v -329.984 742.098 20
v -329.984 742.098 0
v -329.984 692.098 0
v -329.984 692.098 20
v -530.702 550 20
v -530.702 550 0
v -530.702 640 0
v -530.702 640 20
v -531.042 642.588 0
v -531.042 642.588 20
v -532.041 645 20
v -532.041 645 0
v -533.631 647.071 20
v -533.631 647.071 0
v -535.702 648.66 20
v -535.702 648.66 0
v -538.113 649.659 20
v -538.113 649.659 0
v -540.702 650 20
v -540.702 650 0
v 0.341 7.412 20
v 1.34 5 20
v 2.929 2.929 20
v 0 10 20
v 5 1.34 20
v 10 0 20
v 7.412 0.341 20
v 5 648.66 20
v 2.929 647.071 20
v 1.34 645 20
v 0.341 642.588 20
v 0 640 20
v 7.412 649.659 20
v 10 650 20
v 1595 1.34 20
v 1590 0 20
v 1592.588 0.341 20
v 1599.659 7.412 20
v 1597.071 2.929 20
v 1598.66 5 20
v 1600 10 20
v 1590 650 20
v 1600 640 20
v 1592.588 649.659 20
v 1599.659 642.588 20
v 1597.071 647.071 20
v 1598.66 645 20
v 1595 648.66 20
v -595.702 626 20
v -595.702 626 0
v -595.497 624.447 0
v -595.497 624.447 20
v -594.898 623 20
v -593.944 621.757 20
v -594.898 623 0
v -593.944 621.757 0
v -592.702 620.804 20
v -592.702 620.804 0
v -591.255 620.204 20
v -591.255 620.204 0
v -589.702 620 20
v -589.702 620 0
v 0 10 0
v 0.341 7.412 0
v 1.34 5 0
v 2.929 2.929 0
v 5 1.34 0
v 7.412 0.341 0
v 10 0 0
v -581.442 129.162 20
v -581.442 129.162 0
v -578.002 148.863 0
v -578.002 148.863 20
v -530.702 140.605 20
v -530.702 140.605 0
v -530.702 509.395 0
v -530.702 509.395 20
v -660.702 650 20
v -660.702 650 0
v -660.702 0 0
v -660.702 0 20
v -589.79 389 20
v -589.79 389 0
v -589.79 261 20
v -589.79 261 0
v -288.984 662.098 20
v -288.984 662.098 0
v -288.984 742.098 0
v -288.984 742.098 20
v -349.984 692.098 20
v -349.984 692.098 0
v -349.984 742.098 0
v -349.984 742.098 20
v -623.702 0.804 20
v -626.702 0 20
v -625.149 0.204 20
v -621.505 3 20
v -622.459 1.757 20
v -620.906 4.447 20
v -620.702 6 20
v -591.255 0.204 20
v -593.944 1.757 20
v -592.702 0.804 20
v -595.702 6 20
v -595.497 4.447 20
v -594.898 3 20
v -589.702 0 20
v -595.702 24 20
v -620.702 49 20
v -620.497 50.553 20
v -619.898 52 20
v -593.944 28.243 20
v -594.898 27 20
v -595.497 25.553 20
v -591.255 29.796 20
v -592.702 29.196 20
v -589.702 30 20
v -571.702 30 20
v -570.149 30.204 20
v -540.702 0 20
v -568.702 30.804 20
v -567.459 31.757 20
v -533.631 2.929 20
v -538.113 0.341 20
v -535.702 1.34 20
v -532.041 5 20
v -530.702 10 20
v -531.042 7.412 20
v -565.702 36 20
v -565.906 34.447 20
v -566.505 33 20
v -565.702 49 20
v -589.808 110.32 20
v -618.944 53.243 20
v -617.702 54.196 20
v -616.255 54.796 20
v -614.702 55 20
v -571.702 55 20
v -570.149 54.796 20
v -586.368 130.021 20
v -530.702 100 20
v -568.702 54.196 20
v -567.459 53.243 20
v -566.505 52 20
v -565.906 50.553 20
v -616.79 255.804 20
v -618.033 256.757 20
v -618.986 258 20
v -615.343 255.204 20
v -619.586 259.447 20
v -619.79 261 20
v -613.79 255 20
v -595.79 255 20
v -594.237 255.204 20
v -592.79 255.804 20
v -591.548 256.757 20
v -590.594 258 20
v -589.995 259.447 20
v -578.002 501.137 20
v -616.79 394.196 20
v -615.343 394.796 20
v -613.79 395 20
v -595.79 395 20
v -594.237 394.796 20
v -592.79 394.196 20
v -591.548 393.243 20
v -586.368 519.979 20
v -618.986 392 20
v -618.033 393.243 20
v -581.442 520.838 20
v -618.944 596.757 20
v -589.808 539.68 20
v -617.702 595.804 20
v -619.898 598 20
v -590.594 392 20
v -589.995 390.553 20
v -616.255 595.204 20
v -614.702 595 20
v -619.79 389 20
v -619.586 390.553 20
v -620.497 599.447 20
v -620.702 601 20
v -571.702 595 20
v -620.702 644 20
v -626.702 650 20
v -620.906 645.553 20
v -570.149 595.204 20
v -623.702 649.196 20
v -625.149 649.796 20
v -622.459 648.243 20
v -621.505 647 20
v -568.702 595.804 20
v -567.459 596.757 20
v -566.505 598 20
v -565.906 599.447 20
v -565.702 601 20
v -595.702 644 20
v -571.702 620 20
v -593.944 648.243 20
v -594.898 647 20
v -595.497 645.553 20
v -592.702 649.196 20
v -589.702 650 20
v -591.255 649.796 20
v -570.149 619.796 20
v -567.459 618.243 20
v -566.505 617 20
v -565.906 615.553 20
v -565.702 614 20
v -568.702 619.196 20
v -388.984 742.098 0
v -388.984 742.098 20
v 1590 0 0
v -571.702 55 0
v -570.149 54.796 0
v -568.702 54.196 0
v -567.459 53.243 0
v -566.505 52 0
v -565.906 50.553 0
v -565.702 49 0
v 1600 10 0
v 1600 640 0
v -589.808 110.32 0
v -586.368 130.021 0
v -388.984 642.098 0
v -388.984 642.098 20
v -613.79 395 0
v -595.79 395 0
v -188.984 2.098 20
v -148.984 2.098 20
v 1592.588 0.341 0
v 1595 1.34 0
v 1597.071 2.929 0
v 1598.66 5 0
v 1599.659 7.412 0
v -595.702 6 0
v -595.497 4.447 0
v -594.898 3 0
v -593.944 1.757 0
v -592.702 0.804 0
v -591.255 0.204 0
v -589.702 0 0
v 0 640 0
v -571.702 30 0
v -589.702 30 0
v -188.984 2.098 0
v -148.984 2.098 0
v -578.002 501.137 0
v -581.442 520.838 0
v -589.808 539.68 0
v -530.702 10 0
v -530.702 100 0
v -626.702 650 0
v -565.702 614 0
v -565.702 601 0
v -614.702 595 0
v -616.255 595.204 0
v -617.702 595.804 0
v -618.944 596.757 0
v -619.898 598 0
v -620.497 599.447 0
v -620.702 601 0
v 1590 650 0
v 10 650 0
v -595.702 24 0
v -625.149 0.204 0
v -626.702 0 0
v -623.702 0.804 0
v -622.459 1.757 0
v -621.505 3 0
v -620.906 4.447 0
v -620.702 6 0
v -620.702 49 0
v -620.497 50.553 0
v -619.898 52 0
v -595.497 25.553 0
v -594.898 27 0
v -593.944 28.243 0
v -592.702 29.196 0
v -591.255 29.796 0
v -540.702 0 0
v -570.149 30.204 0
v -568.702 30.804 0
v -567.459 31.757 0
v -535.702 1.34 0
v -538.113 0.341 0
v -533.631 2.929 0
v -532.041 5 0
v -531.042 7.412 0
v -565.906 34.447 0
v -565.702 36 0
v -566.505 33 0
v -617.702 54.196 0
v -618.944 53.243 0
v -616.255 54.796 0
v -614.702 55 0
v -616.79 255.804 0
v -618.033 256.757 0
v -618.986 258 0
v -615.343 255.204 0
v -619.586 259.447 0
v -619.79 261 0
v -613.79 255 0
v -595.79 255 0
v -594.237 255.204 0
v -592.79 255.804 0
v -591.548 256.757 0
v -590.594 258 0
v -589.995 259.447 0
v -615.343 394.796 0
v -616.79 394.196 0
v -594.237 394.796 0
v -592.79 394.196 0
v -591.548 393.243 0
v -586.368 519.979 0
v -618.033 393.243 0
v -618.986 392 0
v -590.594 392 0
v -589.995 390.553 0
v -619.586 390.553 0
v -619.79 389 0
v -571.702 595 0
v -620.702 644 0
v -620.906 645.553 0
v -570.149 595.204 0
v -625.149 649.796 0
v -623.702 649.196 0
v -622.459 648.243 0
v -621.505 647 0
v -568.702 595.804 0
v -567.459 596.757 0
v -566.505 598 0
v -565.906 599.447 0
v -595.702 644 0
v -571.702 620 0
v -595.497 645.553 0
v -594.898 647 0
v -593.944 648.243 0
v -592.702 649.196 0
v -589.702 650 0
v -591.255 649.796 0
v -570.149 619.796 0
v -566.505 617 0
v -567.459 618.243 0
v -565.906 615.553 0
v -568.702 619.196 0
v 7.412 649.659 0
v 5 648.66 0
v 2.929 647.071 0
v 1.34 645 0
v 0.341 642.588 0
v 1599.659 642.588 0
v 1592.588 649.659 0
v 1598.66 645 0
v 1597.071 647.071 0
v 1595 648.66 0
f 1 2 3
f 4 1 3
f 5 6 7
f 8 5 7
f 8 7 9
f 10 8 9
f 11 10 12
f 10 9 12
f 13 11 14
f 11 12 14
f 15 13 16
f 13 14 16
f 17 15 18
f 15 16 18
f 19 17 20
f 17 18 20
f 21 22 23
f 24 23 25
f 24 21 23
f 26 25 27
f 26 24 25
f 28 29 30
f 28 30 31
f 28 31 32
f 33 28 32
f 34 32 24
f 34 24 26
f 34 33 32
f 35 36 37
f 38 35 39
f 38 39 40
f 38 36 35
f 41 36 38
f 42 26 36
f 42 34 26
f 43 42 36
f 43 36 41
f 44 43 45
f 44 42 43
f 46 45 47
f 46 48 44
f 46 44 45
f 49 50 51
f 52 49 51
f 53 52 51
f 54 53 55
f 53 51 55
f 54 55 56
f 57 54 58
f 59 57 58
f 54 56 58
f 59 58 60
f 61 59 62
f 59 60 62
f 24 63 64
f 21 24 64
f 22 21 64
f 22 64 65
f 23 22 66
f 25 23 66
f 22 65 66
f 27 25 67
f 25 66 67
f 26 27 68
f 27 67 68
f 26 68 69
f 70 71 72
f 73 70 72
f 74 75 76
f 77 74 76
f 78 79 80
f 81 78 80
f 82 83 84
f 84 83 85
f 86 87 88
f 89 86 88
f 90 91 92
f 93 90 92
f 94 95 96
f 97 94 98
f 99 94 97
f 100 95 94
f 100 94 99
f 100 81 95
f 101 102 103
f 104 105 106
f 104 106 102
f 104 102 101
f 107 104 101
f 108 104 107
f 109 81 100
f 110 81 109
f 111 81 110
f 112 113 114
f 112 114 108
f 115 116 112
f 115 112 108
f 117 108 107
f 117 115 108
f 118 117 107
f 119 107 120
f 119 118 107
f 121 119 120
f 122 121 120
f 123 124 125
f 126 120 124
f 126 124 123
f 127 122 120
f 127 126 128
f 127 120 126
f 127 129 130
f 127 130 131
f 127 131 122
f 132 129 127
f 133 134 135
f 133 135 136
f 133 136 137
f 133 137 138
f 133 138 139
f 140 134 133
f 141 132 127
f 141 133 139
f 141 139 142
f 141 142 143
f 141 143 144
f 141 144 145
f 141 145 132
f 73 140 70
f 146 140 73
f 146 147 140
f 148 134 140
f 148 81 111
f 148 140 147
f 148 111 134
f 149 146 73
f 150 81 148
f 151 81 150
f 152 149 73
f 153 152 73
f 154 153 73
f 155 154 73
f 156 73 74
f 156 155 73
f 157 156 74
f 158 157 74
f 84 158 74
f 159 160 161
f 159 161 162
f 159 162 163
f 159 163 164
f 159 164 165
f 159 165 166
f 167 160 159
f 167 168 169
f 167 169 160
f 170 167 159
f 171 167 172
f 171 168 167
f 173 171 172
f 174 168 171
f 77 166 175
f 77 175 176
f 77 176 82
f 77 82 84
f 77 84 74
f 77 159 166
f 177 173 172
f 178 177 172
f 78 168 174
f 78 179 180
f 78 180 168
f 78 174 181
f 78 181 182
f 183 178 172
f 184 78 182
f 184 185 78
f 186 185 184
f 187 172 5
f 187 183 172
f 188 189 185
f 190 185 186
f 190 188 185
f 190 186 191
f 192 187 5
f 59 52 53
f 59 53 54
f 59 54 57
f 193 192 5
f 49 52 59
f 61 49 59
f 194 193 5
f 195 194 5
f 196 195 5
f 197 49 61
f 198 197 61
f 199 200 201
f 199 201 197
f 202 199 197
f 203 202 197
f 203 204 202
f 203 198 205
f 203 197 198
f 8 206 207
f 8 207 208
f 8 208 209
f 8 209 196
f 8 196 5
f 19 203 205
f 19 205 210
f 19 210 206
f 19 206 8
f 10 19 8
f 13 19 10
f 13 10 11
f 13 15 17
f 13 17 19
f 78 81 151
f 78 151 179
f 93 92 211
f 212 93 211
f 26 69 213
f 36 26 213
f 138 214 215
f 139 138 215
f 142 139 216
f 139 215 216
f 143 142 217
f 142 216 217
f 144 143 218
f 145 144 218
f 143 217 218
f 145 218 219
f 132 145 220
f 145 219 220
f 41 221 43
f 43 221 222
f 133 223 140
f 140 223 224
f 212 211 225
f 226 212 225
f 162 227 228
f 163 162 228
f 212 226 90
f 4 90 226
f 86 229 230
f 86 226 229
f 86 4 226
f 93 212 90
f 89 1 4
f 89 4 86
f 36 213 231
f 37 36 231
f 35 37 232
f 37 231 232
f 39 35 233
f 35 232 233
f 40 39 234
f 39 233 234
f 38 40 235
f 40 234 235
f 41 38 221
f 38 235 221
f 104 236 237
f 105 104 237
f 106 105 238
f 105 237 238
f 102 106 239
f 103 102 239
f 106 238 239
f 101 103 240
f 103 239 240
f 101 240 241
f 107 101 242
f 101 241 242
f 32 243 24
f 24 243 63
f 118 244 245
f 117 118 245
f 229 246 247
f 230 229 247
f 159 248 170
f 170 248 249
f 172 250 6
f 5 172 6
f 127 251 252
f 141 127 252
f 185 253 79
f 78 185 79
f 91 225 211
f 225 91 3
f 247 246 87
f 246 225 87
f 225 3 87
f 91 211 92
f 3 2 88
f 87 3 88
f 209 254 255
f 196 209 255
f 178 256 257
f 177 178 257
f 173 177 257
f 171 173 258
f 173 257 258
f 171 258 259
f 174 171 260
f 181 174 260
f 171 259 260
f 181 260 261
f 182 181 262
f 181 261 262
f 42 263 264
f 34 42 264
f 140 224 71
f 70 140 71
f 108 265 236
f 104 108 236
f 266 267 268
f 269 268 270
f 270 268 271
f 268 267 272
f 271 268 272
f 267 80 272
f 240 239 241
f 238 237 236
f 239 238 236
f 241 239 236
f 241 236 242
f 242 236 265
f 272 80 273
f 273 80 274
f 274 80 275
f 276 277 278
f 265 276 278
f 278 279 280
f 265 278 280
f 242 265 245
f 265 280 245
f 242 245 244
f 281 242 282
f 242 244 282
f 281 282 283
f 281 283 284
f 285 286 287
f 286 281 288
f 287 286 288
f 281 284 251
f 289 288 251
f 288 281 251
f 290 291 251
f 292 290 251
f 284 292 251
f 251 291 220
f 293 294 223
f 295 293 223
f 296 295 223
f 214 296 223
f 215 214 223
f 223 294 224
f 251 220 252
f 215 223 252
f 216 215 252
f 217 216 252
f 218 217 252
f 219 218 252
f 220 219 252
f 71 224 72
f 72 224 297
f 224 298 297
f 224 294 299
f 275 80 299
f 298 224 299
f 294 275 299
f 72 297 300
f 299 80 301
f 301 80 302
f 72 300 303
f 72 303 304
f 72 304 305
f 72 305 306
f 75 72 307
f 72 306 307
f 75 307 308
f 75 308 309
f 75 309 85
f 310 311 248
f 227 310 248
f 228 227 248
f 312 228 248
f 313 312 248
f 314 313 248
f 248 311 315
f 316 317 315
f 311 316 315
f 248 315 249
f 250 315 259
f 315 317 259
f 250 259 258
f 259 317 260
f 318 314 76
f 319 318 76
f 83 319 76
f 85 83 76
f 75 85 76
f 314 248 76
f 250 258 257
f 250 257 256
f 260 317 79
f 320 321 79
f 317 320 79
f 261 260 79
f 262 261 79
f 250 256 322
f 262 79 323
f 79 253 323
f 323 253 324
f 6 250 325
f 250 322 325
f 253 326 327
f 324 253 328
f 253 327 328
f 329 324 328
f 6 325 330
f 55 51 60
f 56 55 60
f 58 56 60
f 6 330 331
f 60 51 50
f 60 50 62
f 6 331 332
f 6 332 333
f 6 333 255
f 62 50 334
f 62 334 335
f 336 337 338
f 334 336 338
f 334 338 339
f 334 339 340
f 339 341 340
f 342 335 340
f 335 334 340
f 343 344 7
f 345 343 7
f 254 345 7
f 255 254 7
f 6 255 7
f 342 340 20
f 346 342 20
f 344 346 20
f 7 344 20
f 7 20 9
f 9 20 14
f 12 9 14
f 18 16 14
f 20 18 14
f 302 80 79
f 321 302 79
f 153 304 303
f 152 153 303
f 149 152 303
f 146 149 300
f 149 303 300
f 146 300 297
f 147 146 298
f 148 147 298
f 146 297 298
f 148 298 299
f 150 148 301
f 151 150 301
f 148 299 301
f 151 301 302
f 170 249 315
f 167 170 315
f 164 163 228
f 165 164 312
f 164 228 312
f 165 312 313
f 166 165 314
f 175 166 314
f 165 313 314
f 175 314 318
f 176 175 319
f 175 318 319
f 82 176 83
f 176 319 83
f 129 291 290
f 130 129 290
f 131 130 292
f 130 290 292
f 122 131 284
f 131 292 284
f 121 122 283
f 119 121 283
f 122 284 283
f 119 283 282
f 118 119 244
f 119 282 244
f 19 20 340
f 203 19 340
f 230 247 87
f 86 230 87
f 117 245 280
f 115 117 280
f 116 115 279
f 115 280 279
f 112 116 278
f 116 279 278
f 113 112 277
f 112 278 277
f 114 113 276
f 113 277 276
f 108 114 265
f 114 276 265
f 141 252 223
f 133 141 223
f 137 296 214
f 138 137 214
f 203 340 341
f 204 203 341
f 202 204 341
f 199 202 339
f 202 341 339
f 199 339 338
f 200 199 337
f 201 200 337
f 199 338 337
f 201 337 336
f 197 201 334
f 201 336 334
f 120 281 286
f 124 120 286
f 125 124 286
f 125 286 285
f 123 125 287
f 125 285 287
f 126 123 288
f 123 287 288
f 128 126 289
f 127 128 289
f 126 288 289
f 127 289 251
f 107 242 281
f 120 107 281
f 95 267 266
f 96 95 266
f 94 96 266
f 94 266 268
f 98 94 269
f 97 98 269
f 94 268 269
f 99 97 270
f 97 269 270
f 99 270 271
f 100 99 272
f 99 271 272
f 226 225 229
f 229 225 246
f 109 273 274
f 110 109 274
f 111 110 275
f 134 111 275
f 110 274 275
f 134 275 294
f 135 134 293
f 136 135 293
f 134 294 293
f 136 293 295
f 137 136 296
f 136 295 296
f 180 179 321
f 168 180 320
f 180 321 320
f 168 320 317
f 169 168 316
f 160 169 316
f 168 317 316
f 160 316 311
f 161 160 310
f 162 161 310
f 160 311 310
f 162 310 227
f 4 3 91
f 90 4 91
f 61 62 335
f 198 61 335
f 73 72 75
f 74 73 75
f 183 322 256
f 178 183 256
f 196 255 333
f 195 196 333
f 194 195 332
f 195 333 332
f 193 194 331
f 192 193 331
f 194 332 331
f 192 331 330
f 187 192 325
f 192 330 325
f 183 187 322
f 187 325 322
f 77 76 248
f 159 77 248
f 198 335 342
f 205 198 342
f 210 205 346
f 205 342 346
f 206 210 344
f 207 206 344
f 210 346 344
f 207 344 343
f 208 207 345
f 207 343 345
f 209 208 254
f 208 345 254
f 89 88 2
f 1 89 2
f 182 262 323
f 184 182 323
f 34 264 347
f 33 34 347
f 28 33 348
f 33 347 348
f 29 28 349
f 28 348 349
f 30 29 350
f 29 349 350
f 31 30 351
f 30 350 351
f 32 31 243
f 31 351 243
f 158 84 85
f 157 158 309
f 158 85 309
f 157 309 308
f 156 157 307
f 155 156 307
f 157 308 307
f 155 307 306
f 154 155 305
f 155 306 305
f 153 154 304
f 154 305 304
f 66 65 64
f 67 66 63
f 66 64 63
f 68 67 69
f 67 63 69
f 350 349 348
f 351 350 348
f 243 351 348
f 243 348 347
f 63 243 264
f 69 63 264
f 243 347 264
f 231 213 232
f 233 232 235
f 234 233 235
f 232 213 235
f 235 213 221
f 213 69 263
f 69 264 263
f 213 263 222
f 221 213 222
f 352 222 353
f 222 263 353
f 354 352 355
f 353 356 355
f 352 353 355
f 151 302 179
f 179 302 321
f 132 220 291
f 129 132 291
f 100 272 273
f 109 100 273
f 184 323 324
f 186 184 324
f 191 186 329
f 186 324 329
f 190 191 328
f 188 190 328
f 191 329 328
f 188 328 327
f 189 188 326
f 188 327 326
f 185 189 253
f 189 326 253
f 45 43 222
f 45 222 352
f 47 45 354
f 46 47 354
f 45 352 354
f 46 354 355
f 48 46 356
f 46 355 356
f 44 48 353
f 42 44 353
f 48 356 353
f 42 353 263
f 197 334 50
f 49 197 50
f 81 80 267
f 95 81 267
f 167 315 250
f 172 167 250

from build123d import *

# Parameters (mm, degrees)
F4_DEPTH = 20
F5_DEPTH = 20
F6_DEPTH = 20


with BuildPart() as f4:
    # F3 (on Top) → F4 (new body)
    with BuildSketch(Plane.XY):
        with BuildLine():
            Line((-589.701622963, 0), (-540.701622963, 0))
            ThreePointArc((-540.701622963, 0), (-533.6305551511, 2.9289321881), (-530.701622963, 10))
            Line((-530.701622963, 10), (-530.701622963, 100))
            Line((-530.701622963, 100), (-589.807523595, 110.319520845))
            Line((-589.807523595, 110.319520845), (-586.3676833134, 130.0214877224))
            Line((-586.3676833134, 130.0214877224), (-581.442191594, 129.1615276519))
            Line((-581.442191594, 129.1615276519), (-578.0023513124, 148.8634945293))
            Line((-578.0023513124, 148.8634945293), (-530.701622963, 140.6050829838))
            Line((-530.701622963, 140.6050829838), (-530.701622963, 509.3949170162))
            Line((-530.701622963, 509.3949170162), (-578.0023513124, 501.1365054707))
            Line((-578.0023513124, 501.1365054707), (-581.442191594, 520.8384723481))
            Line((-581.442191594, 520.8384723481), (-586.3676833134, 519.9785122776))
            Line((-586.3676833134, 519.9785122776), (-589.807523595, 539.680479155))
            Line((-589.807523595, 539.680479155), (-530.701622963, 550))
            Line((-530.701622963, 550), (-530.701622963, 640))
            ThreePointArc((-530.701622963, 640), (-533.6305551511, 647.0710678119), (-540.701622963, 650))
            Line((-540.701622963, 650), (-589.701622963, 650))
            ThreePointArc((-589.701622963, 650), (-593.9442636501, 648.2426406871), (-595.701622963, 644))
            Line((-595.701622963, 644), (-595.701622963, 626))
            ThreePointArc((-595.701622963, 626), (-593.9442636501, 621.7573593129), (-589.701622963, 620))
            Line((-589.701622963, 620), (-571.701622963, 620))
            ThreePointArc((-571.701622963, 620), (-567.4589822758, 618.2426406871), (-565.701622963, 614))
            Line((-565.701622963, 614), (-565.701622963, 601))
            ThreePointArc((-565.701622963, 601), (-567.4589822758, 596.7573593129), (-571.701622963, 595))
            Line((-571.701622963, 595), (-614.701622963, 595))
            ThreePointArc((-614.701622963, 595), (-618.9442636501, 596.7573593129), (-620.701622963, 601))
            Line((-620.701622963, 601), (-620.701622963, 644))
            ThreePointArc((-620.701622963, 644), (-622.4589822758, 648.2426406871), (-626.701622963, 650))
            Line((-626.701622963, 650), (-660.701622963, 650))
            Line((-660.701622963, 650), (-660.701622963, 0))
            Line((-660.701622963, 0), (-626.701622963, 0))
            ThreePointArc((-626.701622963, 0), (-622.4589822758, 1.7573593129), (-620.701622963, 6))
            Line((-620.701622963, 6), (-620.701622963, 49))
            ThreePointArc((-620.701622963, 49), (-618.9442636501, 53.2426406871), (-614.701622963, 55))
            Line((-614.701622963, 55), (-571.701622963, 55))
            ThreePointArc((-571.701622963, 55), (-567.4589822758, 53.2426406871), (-565.701622963, 49))
            Line((-565.701622963, 49), (-565.701622963, 36))
            ThreePointArc((-565.701622963, 36), (-567.4589822758, 31.7573593129), (-571.701622963, 30))
            Line((-571.701622963, 30), (-589.701622963, 30))
            ThreePointArc((-589.701622963, 30), (-593.9442636501, 28.2426406871), (-595.701622963, 24))
            Line((-595.701622963, 24), (-595.701622963, 6))
            ThreePointArc((-595.701622963, 6), (-593.9442636501, 1.7573593129), (-589.701622963, 0))
        make_face()
        with BuildLine():
            Line((-595.7902641296, 255), (-613.7902641296, 255))
            ThreePointArc((-613.7902641296, 255), (-618.0329048168, 256.7573593129), (-619.7902641296, 261))
            Line((-619.7902641296, 261), (-619.7902641296, 325))
            Line((-619.7902641296, 325), (-619.7902641296, 389))
            ThreePointArc((-619.7902641296, 389), (-618.0329048168, 393.2426406871), (-613.7902641296, 395))
            Line((-613.7902641296, 395), (-595.7902641296, 395))
            ThreePointArc((-595.7902641296, 395), (-591.5476234425, 393.2426406871), (-589.7902641296, 389))
            Line((-589.7902641296, 389), (-589.7902641296, 325))
            Line((-589.7902641296, 325), (-589.7902641296, 261))
            ThreePointArc((-589.7902641296, 261), (-591.5476234425, 256.7573593129), (-595.7902641296, 255))
        make_face(mode=Mode.SUBTRACT)
    extrude(amount=F4_DEPTH)


with BuildPart() as f5:
    # F2 (on Top) → F5 (new body)
    with BuildSketch(Plane.XY):
        Polygon((-188.9841258526, 2.0980232812), (-148.9841258526, 2.0980232812), (-288.9841258526, 662.0980232812), (-288.9841258526, 742.0980232812), (-329.9841258526, 742.0980232812), (-329.9841258526, 692.0980232812), (-349.9841258526, 692.0980232812), (-349.9841258526, 742.0980232812), (-388.9841258526, 742.0980232812), (-388.9841258526, 642.0980232812), align=None)
    extrude(amount=F5_DEPTH)


with BuildPart() as f6:
    # F1 (on Top) → F6 (new body)
    with BuildSketch(Plane.XY):
        with BuildLine():
            ThreePointArc((0, 10), (2.9289321881, 2.9289321881), (10, 0))
            Line((10, 0), (1590, 0))
            ThreePointArc((1590, 0), (1597.0710678119, 2.9289321881), (1600, 10))
            Line((1600, 10), (1600, 640))
            ThreePointArc((1600, 640), (1597.0710678119, 647.0710678119), (1590, 650))
            Line((1590, 650), (10, 650))
            ThreePointArc((10, 650), (2.9289321881, 647.0710678119), (0, 640))
            Line((0, 640), (0, 10))
        make_face()
        with BuildLine():
            Line((50, 311), (50, 339))
            ThreePointArc((50, 339), (51.7573593129, 343.2426406871), (56, 345))
            Line((56, 345), (244, 345))
            ThreePointArc((244, 345), (248.2426406871, 343.2426406871), (250, 339))
            Line((250, 339), (250, 311))
            ThreePointArc((250, 311), (248.2426406871, 306.7573593129), (244, 305))
            Line((244, 305), (56, 305))
            ThreePointArc((56, 305), (51.7573593129, 306.7573593129), (50, 311))
        make_face(mode=Mode.SUBTRACT)
        with BuildLine():
            ThreePointArc((1550, 311), (1548.2426406871, 306.7573593129), (1544, 305))
            Line((1544, 305), (1356, 305))
            ThreePointArc((1356, 305), (1351.7573593129, 306.7573593129), (1350, 311))
            Line((1350, 311), (1350, 339))
            ThreePointArc((1350, 339), (1351.7573593129, 343.2426406871), (1356, 345))
            Line((1356, 345), (1544, 345))
            ThreePointArc((1544, 345), (1548.2426406871, 343.2426406871), (1550, 339))
            Line((1550, 339), (1550, 311))
        make_face(mode=Mode.SUBTRACT)
        with BuildLine():
            ThreePointArc((1550, 361), (1548.2426406871, 356.7573593129), (1544, 355))
            Line((1544, 355), (1356, 355))
            ThreePointArc((1356, 355), (1351.7573593129, 356.7573593129), (1350, 361))
            Line((1350, 361), (1350, 363))
            ThreePointArc((1350, 363), (1351.7573593129, 367.2426406871), (1356, 369))
            Line((1356, 369), (1544, 369))
            ThreePointArc((1544, 369), (1548.2426406871, 367.2426406871), (1550, 363))
            Line((1550, 363), (1550, 361))
        make_face(mode=Mode.SUBTRACT)
        with BuildLine():
            Line((1356, 355), (1544, 355))
            ThreePointArc((1544, 355), (1548.2426406871, 356.7573593129), (1550, 361))
            Line((1550, 361), (1550, 363))
            ThreePointArc((1550, 363), (1548.2426406871, 367.2426406871), (1544, 369))
            Line((1544, 369), (1356, 369))
            ThreePointArc((1356, 369), (1351.7573593129, 367.2426406871), (1350, 363))
            Line((1350, 363), (1350, 361))
            ThreePointArc((1350, 361), (1351.7573593129, 356.7573593129), (1356, 355))
        make_face()
        with BuildLine():
            ThreePointArc((56, 345), (51.7573593129, 343.2426406871), (50, 339))
            Line((50, 339), (50, 311))
            ThreePointArc((50, 311), (51.7573593129, 306.7573593129), (56, 305))
            Line((56, 305), (244, 305))
            ThreePointArc((244, 305), (248.2426406871, 306.7573593129), (250, 311))
            Line((250, 311), (250, 339))
            ThreePointArc((250, 339), (248.2426406871, 343.2426406871), (244, 345))
            Line((244, 345), (56, 345))
        make_face()
        with BuildLine():
            Line((1356, 305), (1544, 305))
            ThreePointArc((1544, 305), (1548.2426406871, 306.7573593129), (1550, 311))
            Line((1550, 311), (1550, 339))
            ThreePointArc((1550, 339), (1548.2426406871, 343.2426406871), (1544, 345))
            Line((1544, 345), (1356, 345))
            ThreePointArc((1356, 345), (1351.7573593129, 343.2426406871), (1350, 339))
            Line((1350, 339), (1350, 311))
            ThreePointArc((1350, 311), (1351.7573593129, 306.7573593129), (1356, 305))
        make_face()
    extrude(amount=F6_DEPTH)


solid = Compound([f4.part, f5.part, f6.part])
